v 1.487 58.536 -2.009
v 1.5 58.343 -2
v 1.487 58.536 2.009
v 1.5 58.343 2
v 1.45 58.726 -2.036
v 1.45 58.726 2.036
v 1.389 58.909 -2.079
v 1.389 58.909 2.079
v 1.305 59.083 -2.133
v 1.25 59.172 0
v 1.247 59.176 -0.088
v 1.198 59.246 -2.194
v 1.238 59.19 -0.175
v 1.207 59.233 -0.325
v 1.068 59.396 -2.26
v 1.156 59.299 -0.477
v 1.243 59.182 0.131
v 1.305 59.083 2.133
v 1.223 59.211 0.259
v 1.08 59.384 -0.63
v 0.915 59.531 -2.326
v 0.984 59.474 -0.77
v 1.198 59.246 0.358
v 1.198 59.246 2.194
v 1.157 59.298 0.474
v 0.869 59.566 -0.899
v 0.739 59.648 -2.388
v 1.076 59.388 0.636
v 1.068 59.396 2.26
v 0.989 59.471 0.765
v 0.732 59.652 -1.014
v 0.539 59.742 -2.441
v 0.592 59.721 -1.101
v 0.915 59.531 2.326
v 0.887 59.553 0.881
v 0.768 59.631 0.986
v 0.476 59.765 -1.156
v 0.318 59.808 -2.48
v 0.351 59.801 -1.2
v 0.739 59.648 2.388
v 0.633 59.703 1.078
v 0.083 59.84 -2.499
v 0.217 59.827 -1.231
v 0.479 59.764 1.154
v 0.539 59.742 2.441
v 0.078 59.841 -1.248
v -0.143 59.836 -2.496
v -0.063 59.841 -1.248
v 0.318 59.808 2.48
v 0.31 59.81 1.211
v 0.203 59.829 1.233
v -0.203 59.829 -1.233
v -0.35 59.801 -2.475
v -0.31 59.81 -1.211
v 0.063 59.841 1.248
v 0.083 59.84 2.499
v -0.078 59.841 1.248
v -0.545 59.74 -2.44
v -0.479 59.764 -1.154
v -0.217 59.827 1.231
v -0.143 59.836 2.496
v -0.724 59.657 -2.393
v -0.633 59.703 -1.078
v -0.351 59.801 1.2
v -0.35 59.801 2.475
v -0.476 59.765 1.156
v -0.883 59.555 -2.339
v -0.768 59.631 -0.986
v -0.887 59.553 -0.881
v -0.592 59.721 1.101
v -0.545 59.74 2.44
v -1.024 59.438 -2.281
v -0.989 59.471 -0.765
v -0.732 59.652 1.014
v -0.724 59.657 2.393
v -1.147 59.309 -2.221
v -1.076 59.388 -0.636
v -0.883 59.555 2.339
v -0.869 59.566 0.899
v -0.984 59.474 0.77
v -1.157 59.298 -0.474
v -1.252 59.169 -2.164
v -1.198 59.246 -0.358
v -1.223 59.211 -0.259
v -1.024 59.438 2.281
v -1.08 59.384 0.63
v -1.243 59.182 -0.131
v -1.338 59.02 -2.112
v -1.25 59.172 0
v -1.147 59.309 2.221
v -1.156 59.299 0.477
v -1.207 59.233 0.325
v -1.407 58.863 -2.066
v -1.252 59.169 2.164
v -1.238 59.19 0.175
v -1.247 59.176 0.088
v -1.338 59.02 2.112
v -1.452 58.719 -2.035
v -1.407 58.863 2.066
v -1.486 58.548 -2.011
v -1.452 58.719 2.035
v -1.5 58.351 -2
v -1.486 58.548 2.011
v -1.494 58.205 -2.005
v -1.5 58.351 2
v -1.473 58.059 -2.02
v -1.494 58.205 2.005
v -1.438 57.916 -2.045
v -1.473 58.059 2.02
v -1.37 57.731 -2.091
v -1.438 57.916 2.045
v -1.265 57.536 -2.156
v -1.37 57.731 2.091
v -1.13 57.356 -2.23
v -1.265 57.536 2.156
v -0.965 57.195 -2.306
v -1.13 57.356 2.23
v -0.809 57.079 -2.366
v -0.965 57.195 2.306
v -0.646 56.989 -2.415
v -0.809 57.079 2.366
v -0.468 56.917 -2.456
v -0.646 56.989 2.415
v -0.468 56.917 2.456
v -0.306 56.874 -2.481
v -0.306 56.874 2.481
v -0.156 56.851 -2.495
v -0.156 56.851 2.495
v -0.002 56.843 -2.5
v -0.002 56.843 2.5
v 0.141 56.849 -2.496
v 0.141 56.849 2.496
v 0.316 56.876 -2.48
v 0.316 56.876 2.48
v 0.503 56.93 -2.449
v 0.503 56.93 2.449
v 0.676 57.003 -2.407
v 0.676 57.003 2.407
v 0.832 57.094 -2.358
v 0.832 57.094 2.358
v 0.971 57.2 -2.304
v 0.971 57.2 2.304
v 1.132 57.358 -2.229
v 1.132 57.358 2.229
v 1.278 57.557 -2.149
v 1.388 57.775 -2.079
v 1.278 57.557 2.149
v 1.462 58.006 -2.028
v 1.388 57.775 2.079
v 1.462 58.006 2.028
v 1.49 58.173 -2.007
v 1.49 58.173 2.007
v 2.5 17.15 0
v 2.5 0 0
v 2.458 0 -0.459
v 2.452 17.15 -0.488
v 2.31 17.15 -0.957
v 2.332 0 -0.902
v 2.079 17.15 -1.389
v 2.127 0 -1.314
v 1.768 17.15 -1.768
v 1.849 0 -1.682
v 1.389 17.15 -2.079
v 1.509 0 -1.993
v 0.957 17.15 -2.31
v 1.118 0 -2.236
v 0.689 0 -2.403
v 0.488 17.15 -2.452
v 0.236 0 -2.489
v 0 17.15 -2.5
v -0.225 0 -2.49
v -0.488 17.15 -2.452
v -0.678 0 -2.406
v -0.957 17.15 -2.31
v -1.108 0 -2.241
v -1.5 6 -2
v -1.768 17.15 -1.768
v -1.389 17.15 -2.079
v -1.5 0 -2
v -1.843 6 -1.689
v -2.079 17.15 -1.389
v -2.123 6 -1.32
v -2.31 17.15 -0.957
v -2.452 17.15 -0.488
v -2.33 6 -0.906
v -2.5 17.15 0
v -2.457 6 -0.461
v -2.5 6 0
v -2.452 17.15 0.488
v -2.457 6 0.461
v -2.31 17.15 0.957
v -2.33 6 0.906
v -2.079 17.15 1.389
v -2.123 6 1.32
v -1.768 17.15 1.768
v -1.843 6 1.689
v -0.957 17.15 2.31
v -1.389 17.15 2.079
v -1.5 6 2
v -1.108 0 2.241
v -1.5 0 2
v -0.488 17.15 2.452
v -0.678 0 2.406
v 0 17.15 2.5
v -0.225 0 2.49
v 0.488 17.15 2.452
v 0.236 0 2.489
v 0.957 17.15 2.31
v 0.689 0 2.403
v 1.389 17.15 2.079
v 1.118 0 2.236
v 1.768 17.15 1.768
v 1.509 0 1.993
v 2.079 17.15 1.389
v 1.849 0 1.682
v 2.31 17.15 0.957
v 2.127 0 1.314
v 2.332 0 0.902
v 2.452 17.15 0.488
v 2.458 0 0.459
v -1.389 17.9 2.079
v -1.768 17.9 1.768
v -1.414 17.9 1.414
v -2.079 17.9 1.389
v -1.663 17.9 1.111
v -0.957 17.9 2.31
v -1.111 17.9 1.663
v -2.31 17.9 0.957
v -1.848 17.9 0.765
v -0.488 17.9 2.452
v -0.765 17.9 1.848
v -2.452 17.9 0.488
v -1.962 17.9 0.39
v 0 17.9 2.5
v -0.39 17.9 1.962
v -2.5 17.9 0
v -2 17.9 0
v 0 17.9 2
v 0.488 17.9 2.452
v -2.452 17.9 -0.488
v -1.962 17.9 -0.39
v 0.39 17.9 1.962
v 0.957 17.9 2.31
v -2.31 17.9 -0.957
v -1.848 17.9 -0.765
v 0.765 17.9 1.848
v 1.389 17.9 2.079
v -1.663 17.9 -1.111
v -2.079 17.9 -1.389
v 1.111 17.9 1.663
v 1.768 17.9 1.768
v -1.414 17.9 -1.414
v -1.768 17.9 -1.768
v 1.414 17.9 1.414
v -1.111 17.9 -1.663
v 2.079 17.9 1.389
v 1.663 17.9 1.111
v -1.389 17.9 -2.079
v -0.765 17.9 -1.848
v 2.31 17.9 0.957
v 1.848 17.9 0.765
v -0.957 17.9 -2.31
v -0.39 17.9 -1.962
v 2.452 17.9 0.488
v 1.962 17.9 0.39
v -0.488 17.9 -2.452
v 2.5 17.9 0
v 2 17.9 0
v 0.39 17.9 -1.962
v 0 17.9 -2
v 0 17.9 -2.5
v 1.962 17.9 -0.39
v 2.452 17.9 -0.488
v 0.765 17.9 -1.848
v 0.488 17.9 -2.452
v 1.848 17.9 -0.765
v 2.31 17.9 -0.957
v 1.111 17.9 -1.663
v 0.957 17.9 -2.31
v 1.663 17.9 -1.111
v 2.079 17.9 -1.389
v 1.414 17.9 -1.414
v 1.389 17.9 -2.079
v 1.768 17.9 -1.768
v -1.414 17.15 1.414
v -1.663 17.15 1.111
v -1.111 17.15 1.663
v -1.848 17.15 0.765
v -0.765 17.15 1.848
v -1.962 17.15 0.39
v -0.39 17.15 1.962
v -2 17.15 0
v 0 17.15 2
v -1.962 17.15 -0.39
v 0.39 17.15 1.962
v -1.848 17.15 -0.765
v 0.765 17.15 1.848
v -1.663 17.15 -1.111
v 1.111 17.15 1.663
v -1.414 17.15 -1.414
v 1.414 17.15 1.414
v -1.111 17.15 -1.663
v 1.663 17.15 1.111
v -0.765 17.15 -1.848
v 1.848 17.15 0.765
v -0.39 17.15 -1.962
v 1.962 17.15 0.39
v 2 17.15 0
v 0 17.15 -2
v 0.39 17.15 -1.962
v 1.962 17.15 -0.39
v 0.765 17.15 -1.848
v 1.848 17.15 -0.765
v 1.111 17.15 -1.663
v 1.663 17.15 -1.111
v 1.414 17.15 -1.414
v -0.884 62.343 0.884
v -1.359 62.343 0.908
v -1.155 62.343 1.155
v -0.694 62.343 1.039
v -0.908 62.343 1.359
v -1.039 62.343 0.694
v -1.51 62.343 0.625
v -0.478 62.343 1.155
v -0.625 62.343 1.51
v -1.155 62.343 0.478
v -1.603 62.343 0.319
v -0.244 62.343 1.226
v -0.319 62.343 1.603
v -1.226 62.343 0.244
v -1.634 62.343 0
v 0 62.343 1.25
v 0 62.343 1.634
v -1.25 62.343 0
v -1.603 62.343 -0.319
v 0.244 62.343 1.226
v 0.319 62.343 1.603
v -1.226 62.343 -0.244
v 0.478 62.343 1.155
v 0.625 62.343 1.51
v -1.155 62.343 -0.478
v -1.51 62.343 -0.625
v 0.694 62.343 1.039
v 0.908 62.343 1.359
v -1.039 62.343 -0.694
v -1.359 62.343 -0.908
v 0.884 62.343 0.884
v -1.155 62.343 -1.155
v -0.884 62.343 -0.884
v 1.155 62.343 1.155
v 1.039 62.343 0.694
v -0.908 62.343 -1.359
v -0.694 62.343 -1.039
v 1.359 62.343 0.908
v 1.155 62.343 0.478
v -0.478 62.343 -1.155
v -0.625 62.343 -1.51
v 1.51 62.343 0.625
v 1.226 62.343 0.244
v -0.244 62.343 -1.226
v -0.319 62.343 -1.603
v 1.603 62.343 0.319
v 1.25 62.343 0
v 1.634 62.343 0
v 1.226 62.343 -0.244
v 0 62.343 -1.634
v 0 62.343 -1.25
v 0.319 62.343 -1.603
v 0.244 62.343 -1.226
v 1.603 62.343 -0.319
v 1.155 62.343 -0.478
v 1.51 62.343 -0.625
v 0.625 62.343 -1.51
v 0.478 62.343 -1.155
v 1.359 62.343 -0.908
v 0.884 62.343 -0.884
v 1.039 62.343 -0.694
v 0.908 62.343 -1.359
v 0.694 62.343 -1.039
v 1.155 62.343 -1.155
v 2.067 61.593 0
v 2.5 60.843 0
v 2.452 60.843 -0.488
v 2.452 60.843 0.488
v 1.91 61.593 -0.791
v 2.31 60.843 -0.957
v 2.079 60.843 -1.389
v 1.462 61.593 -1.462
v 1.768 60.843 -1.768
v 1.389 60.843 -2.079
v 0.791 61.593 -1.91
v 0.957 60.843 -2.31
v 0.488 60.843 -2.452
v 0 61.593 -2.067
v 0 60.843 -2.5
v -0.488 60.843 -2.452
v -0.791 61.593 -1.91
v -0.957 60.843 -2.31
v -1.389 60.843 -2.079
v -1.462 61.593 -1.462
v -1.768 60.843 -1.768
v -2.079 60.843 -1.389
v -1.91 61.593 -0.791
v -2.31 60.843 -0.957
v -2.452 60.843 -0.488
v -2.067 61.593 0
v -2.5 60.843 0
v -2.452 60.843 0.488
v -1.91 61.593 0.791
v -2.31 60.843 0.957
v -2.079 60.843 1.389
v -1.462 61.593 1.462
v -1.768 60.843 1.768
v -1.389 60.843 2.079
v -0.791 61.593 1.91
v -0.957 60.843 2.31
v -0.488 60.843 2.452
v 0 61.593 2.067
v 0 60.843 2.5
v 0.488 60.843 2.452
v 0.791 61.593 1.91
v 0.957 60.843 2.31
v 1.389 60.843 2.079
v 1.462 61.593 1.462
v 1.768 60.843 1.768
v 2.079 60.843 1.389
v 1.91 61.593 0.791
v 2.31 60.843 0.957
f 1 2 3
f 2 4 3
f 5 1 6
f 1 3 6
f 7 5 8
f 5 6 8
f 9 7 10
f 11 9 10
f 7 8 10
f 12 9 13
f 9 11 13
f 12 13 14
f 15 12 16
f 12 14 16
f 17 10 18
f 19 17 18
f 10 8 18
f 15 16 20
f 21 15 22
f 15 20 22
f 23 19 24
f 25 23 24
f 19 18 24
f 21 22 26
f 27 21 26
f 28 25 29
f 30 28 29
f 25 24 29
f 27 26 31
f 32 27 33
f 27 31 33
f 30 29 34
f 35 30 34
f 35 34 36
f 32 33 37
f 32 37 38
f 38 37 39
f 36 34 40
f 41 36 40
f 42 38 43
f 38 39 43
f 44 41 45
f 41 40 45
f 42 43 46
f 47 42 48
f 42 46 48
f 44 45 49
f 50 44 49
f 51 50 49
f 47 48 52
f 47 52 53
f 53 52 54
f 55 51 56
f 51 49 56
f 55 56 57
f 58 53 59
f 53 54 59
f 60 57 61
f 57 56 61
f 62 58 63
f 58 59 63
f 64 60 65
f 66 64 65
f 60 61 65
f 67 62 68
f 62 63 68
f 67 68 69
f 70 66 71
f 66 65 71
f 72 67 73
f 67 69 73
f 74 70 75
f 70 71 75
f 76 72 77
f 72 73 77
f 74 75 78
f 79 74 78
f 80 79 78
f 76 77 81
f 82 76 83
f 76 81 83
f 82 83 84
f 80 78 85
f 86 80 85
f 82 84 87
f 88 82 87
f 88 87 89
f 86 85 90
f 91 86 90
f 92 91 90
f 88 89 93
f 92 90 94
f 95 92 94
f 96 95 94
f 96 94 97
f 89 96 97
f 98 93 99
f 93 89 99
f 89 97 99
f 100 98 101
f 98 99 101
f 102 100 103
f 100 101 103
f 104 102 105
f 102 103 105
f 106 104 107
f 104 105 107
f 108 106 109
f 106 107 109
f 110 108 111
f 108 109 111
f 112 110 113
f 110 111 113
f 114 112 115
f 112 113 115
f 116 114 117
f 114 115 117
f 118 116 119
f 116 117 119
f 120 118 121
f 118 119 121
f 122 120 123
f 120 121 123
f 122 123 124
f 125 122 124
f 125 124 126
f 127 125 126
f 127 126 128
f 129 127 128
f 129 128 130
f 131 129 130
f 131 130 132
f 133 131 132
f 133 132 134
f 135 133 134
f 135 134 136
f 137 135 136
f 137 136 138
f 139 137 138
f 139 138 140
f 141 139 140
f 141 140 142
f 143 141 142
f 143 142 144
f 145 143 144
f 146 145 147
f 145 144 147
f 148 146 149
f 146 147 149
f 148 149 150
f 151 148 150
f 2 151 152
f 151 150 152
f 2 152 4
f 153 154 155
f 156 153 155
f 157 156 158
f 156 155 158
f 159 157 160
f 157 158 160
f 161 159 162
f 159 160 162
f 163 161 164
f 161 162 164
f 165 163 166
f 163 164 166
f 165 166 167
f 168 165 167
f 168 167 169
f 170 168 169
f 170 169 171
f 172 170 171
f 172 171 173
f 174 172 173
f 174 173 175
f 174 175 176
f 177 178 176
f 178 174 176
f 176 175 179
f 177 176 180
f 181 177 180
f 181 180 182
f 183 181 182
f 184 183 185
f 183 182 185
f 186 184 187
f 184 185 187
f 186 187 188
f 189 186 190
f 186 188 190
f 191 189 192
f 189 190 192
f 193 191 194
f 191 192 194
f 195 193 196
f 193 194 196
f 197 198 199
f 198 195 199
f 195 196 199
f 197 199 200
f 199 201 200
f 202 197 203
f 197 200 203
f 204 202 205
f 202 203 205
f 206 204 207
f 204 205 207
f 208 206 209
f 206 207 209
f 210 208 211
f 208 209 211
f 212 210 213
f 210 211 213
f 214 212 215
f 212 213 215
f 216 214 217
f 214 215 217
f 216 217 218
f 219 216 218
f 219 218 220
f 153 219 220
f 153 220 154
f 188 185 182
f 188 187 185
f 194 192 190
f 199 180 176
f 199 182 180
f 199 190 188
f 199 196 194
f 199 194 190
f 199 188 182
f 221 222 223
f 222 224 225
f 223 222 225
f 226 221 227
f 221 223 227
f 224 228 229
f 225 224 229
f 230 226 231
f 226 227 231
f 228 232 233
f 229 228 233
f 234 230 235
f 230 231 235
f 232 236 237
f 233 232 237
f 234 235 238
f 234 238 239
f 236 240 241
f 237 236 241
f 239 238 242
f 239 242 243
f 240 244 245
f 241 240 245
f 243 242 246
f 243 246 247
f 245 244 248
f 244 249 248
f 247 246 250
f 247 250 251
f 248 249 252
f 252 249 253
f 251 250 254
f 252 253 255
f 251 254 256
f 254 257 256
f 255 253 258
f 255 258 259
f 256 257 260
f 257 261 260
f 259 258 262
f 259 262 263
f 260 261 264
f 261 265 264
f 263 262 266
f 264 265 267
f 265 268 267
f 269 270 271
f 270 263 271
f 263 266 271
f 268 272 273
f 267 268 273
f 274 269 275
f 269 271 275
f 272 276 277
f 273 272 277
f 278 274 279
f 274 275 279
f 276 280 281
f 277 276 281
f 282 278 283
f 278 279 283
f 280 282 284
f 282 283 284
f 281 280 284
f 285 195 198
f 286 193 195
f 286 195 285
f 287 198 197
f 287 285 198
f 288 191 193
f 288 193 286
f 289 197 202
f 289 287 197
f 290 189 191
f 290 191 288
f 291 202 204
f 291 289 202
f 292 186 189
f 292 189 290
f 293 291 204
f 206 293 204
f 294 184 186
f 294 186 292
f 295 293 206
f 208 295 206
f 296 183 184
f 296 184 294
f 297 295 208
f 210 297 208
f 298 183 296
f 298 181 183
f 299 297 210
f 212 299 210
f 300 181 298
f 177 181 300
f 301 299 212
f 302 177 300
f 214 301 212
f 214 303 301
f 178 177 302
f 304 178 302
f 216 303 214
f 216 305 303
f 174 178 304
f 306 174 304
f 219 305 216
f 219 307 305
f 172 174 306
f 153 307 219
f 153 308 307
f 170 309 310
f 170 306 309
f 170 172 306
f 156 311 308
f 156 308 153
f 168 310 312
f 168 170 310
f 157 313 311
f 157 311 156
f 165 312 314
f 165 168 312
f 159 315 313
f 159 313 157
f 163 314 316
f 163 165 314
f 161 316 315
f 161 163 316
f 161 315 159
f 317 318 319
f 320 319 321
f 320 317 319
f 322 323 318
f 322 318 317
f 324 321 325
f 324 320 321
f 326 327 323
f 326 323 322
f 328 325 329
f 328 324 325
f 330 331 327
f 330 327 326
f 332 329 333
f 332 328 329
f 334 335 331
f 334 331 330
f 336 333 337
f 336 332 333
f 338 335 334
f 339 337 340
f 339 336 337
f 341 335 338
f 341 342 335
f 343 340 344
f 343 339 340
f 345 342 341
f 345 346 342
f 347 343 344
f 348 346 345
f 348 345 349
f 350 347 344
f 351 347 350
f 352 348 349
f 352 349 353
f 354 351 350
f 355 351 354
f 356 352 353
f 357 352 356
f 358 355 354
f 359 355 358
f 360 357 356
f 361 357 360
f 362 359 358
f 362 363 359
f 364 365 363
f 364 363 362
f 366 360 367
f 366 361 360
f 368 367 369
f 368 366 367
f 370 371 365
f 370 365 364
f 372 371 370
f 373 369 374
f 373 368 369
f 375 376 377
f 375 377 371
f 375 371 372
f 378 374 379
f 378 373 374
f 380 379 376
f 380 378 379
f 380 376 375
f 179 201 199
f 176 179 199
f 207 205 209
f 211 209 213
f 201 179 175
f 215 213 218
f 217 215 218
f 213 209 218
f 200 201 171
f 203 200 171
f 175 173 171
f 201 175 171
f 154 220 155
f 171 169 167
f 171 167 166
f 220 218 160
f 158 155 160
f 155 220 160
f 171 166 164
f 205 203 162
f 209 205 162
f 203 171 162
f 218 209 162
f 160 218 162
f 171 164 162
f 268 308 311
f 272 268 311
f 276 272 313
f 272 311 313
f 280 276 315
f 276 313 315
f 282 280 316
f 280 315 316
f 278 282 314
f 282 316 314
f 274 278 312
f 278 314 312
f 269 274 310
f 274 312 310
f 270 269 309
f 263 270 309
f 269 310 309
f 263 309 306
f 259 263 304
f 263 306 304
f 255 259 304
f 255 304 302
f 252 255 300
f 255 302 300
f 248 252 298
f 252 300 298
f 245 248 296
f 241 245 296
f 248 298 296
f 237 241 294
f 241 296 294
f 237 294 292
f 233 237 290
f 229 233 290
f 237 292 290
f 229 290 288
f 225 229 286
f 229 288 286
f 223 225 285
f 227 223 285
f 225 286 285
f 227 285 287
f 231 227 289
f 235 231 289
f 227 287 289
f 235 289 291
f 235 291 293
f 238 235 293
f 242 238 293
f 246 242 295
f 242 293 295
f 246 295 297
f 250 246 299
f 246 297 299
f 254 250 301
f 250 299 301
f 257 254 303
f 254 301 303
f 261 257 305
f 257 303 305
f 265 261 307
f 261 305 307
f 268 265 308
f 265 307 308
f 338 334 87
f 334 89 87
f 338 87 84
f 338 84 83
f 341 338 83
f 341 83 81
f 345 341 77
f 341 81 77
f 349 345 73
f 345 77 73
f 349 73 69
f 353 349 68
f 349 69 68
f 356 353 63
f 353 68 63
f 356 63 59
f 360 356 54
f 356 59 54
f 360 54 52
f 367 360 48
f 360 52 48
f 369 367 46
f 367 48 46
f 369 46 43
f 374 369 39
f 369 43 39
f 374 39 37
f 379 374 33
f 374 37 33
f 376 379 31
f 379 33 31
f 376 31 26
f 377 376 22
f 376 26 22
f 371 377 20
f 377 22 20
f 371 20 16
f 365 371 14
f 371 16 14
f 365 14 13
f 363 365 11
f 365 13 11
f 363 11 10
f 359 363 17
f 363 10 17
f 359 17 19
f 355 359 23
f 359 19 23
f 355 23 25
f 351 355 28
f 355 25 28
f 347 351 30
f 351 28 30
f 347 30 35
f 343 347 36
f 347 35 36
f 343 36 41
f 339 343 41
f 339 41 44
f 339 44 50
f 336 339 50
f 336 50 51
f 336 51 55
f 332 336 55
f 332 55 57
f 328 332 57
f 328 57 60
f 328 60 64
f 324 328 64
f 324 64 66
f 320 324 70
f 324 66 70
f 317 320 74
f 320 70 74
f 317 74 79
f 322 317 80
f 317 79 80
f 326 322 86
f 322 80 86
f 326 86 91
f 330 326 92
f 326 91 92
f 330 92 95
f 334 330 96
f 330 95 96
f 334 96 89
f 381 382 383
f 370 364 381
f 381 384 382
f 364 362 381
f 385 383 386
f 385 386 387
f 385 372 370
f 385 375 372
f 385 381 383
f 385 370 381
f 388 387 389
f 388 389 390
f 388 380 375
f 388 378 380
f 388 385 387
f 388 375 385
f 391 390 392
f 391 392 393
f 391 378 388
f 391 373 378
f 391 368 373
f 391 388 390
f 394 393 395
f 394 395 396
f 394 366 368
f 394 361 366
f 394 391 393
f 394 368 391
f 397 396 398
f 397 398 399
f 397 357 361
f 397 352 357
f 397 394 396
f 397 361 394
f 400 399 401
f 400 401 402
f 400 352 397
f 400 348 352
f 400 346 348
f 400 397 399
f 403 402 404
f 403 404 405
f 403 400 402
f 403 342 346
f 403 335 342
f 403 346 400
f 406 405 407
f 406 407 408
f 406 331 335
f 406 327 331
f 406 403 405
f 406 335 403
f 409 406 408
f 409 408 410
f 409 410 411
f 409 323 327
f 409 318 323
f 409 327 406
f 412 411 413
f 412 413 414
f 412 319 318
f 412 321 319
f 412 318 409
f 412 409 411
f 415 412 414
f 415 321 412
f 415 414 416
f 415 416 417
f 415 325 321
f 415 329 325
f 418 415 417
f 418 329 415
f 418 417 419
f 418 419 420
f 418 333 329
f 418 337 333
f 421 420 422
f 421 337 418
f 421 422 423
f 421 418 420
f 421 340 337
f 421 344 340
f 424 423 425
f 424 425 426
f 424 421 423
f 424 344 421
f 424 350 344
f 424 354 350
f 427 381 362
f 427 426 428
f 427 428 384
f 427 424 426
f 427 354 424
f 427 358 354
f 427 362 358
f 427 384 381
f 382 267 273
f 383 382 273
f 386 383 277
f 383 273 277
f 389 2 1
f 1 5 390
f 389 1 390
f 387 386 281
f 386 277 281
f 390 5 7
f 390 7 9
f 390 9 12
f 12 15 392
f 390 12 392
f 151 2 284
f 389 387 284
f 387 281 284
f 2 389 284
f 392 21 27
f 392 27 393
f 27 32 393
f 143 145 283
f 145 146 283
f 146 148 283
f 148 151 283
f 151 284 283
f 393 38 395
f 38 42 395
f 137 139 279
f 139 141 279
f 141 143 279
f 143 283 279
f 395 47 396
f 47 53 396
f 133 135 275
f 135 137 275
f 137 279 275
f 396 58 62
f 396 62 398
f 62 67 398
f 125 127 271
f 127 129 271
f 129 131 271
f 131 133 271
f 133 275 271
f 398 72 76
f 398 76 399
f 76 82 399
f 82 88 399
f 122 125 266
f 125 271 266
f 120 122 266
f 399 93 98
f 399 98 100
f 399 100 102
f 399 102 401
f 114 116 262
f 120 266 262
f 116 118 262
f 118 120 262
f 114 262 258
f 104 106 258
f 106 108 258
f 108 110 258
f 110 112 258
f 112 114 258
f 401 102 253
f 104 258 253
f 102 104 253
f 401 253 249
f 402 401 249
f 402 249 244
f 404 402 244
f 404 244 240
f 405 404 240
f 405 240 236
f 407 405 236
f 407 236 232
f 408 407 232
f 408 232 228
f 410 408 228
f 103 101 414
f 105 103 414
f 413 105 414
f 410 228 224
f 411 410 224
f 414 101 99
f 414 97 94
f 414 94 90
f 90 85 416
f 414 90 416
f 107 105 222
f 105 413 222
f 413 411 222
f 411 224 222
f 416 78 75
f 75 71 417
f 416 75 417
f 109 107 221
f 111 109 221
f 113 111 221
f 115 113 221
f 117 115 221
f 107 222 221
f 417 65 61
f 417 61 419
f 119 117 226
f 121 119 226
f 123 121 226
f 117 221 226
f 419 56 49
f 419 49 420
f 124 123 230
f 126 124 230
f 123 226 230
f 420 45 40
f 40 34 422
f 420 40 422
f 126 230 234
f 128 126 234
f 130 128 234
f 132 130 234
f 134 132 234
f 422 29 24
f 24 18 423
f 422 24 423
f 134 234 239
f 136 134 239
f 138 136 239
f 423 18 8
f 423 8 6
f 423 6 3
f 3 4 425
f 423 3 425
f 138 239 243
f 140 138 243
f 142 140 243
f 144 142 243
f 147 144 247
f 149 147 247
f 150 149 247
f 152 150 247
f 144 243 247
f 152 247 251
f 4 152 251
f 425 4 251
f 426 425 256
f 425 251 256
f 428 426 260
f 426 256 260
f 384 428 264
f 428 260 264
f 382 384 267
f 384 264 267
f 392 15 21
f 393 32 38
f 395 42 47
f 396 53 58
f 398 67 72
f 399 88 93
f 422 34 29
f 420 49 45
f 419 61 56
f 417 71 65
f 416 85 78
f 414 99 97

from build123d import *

# Parameters (mm, degrees)
SKETCH3_R                 = 2.5
BOSS_EXTRUDE1_DEPTH       = 62.34264779
CHAMFER1_SIZE             = 1.5
CHAMFER1_SIZE2            = 0.866025404
M3X0_5_TAPPED_HOLE1_D     = 2.5
M3X0_5_TAPPED_HOLE1_DEPTH = 4
M3X0_5_TAPPED_HOLE1_TIP   = 0.751075774
SKETCH7_R                 = 1.5
CUT_EXTRUDE1_DEPTH        = 3.5
CUT_EXTRUDE1_DEPTH_BACK   = 3.5
SKETCH8_W                 = 1
SKETCH8_H                 = 6
CUT_EXTRUDE2_DEPTH        = 3.5000001
CUT_EXTRUDE2_DEPTH_BACK   = 3.5000001
SKETCH9_R                 = 3
SKETCH9_R_2               = 2
CUT_EXTRUDE3_DEPTH        = 0.75


with BuildPart() as part:
    # Sketch3 → Boss-Extrude1 (new body)
    with BuildSketch(Plane(origin=(0, 0, 0), x_dir=(1, 0, 0), z_dir=(0, 1, 0))):
        Circle(SKETCH3_R)
    extrude(amount=BOSS_EXTRUDE1_DEPTH)

    # Chamfer1
    chamfer1_edges = [part.edges().sort_by_distance(p)[0] for p in [
        (-2.5, 62.34264779, 0),
    ]]
    chamfer1_side = [part.faces().sort_by_distance(p)[0] for p in [
        (-2.5, 31.171323895, 0),
    ]]
    chamfer(chamfer1_edges, length=CHAMFER1_SIZE, length2=CHAMFER1_SIZE2, reference=chamfer1_side[0])

    # M3x0.5 Tapped Hole1
    with Locations(Plane(origin=(0, 62.34264779, 0), x_dir=(1, 0, 0), z_dir=(0, 1, 0))):
        with Locations((0, 0)):
            Hole(M3X0_5_TAPPED_HOLE1_D / 2, depth=M3X0_5_TAPPED_HOLE1_DEPTH)
            with Locations((0, 0, -(M3X0_5_TAPPED_HOLE1_DEPTH + M3X0_5_TAPPED_HOLE1_TIP / 2))):  # 118° drill point
                Cone(0, M3X0_5_TAPPED_HOLE1_D / 2, M3X0_5_TAPPED_HOLE1_TIP, mode=Mode.SUBTRACT)

    # Sketch7 → Cut-Extrude1 (cut, two sides)
    with BuildSketch(Plane.XY) as cut_extrude1_sk:
        with Locations((0, 58.34264779)):
            Circle(SKETCH7_R)
    extrude(amount=CUT_EXTRUDE1_DEPTH, mode=Mode.SUBTRACT)
    extrude(cut_extrude1_sk.sketch, amount=-CUT_EXTRUDE1_DEPTH_BACK, mode=Mode.SUBTRACT)

    # Sketch8 → Cut-Extrude2 (cut, two sides)
    with BuildSketch(Plane.XY) as cut_extrude2_sk:
        with Locations((-2, 3)):
            Rectangle(SKETCH8_W, SKETCH8_H)
    extrude(amount=CUT_EXTRUDE2_DEPTH, mode=Mode.SUBTRACT)
    extrude(cut_extrude2_sk.sketch, amount=-CUT_EXTRUDE2_DEPTH_BACK, mode=Mode.SUBTRACT)

    # Sketch9 → Cut-Extrude3 (cut)
    with BuildSketch(Plane(origin=(0, 17.15, 0), x_dir=(1, 0, 0), z_dir=(0, 1, 0))):
        Circle(SKETCH9_R)
        Circle(SKETCH9_R_2, mode=Mode.SUBTRACT)
    extrude(amount=CUT_EXTRUDE3_DEPTH, mode=Mode.SUBTRACT)


solid = part.part
